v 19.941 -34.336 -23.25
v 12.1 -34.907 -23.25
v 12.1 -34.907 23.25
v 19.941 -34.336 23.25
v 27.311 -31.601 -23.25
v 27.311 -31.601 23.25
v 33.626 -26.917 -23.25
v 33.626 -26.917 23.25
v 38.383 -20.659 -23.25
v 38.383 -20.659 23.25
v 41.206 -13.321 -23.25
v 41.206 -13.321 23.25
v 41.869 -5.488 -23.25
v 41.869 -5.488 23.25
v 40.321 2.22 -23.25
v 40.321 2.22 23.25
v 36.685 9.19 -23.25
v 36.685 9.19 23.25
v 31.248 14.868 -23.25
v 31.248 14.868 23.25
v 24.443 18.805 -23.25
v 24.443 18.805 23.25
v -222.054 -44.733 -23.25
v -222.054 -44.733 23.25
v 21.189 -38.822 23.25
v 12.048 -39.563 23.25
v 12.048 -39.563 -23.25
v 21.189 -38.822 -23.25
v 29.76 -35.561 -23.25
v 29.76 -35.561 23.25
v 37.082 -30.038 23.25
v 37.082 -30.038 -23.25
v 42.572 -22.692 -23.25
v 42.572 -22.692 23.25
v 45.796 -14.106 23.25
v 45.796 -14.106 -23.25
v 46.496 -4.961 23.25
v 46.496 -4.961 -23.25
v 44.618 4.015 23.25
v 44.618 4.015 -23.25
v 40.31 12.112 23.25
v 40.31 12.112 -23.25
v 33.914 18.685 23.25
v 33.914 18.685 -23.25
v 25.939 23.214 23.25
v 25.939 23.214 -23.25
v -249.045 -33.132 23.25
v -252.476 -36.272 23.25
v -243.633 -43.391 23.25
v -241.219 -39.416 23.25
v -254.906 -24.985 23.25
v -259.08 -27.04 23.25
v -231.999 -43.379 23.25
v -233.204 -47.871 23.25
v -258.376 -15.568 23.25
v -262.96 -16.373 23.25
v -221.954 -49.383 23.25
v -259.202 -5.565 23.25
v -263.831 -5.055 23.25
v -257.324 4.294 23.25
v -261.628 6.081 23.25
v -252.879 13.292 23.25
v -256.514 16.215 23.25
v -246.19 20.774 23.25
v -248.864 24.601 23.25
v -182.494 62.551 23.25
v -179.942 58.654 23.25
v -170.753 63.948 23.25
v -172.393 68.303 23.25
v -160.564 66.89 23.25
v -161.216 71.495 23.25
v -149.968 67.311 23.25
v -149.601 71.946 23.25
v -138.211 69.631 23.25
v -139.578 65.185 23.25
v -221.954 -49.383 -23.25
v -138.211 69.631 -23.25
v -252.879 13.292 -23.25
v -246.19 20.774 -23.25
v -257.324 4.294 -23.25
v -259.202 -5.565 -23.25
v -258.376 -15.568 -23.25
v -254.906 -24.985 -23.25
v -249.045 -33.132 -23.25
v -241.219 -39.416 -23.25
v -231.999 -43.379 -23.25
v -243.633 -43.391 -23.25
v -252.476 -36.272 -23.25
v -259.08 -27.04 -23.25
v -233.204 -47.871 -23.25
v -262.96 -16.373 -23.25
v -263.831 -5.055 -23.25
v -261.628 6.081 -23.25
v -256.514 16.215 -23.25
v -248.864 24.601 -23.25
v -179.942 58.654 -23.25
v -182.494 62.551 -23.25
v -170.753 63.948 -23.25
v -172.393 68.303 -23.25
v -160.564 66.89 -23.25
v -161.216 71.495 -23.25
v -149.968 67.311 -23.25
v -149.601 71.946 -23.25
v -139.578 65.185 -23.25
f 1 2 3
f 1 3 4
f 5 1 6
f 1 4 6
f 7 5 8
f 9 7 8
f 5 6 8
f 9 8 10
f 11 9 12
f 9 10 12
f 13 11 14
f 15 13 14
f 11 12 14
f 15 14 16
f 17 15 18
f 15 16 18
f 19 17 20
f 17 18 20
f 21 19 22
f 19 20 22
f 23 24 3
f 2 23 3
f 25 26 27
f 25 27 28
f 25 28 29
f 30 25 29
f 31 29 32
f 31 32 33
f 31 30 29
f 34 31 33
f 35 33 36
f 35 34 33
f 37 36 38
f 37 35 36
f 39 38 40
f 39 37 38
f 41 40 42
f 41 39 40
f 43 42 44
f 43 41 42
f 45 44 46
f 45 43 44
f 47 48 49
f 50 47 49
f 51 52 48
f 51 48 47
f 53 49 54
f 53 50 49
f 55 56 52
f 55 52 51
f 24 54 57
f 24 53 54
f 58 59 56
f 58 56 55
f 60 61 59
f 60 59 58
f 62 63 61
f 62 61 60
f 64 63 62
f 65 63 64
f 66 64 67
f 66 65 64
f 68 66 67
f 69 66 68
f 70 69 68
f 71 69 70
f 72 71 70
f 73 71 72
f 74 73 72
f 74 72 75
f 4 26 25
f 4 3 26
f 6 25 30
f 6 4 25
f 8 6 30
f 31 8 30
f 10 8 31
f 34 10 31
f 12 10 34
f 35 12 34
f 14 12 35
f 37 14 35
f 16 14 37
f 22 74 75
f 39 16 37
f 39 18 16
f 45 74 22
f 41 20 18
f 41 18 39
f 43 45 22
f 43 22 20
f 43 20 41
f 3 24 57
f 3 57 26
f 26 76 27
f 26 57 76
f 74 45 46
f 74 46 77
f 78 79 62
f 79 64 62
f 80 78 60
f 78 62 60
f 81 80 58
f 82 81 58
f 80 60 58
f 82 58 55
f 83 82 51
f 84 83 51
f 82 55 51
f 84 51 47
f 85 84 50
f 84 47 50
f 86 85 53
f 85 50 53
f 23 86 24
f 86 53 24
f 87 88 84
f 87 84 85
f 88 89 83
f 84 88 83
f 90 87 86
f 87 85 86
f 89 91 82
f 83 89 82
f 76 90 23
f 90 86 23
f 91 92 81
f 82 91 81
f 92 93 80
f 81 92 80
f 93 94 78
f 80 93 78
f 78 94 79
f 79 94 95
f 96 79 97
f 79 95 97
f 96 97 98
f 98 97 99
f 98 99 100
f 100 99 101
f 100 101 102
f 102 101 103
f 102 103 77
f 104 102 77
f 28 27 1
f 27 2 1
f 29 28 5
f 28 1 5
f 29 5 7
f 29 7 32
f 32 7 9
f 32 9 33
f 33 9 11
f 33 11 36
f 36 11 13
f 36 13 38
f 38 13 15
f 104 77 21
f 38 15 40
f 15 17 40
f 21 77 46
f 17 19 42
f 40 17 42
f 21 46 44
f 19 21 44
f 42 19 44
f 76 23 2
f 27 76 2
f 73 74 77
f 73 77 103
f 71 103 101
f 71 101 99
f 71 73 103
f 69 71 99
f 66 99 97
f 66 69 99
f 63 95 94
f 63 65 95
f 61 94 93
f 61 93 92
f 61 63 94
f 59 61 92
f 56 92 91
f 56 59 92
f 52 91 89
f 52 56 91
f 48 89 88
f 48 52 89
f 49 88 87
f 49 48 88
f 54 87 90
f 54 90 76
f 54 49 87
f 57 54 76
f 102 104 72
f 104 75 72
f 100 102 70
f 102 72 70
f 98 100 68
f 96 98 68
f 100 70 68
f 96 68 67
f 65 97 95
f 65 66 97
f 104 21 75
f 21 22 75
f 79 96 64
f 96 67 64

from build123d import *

# Parameters (mm, degrees)
ESTRUSIONE_SOTTILE1_DEPTH      = 25
ESTRUSIONE_SOTTILE1_DEPTH_BACK = 25
SCALE2_SCALE                   = 0.93


with BuildPart() as part:
    # Schizzo2 → Estrusione-Sottile1 (new, two sides)
    with BuildSketch(Plane(origin=(-3.626199773, -4.388168382, 0), x_dir=(1, 0, 0), z_dir=(0, 0, 1))) as estrusione_sottile1_sk:
        with BuildLine():
            Line((-226.626080874, -48.830329598), (24.988136504, -38.271646045))
            ThreePointArc((24.988136504, -38.271646045), (61.276185696, -10.897676453), (39.925535167, 29.230947338))
            Line((39.925535167, 29.230947338), (-136.579797, 79.141284263))
            ThreePointArc((-136.579797, 79.141284263), (-161.317329277, 81.14637928), (-184.196927163, 71.52921183))
            Line((-184.196927163, 71.52921183), (-255.562423669, 30.722741893))
            ThreePointArc((-255.562423669, 30.722741893), (-269.023375691, -19.212630891), (-226.626080874, -48.830329598))
        make_face()
        with BuildLine():
            Line((-226.734029631, -43.830459075), (25.044382174, -33.264885303))
            ThreePointArc((25.044382174, -33.264885303), (56.34084272, -10.054333528), (38.316167271, 24.489974706))
            Line((38.316167271, 24.489974706), (-138.050550004, 74.361115557))
            ThreePointArc((-138.050550004, 74.361115557), (-160.616278185, 76.194878875), (-181.452431457, 67.338836133))
            Line((-181.452431457, 67.338836133), (-252.686438473, 26.607551295))
            ThreePointArc((-252.686438473, 26.607551295), (-264.26748414, -17.659406707), (-226.734029631, -43.830459075))
        make_face(mode=Mode.SUBTRACT)
    extrude(amount=ESTRUSIONE_SOTTILE1_DEPTH)
    extrude(estrusione_sottile1_sk.sketch, amount=-ESTRUSIONE_SOTTILE1_DEPTH_BACK)


with BuildPart() as part_1:
    # Scale2: scaled about (-111.699071241, 1.574242956, 0)
    add(part.part.scale(SCALE2_SCALE).moved(Location((-7.818934987, 0.110197007, 0))))


solid = part_1.part
